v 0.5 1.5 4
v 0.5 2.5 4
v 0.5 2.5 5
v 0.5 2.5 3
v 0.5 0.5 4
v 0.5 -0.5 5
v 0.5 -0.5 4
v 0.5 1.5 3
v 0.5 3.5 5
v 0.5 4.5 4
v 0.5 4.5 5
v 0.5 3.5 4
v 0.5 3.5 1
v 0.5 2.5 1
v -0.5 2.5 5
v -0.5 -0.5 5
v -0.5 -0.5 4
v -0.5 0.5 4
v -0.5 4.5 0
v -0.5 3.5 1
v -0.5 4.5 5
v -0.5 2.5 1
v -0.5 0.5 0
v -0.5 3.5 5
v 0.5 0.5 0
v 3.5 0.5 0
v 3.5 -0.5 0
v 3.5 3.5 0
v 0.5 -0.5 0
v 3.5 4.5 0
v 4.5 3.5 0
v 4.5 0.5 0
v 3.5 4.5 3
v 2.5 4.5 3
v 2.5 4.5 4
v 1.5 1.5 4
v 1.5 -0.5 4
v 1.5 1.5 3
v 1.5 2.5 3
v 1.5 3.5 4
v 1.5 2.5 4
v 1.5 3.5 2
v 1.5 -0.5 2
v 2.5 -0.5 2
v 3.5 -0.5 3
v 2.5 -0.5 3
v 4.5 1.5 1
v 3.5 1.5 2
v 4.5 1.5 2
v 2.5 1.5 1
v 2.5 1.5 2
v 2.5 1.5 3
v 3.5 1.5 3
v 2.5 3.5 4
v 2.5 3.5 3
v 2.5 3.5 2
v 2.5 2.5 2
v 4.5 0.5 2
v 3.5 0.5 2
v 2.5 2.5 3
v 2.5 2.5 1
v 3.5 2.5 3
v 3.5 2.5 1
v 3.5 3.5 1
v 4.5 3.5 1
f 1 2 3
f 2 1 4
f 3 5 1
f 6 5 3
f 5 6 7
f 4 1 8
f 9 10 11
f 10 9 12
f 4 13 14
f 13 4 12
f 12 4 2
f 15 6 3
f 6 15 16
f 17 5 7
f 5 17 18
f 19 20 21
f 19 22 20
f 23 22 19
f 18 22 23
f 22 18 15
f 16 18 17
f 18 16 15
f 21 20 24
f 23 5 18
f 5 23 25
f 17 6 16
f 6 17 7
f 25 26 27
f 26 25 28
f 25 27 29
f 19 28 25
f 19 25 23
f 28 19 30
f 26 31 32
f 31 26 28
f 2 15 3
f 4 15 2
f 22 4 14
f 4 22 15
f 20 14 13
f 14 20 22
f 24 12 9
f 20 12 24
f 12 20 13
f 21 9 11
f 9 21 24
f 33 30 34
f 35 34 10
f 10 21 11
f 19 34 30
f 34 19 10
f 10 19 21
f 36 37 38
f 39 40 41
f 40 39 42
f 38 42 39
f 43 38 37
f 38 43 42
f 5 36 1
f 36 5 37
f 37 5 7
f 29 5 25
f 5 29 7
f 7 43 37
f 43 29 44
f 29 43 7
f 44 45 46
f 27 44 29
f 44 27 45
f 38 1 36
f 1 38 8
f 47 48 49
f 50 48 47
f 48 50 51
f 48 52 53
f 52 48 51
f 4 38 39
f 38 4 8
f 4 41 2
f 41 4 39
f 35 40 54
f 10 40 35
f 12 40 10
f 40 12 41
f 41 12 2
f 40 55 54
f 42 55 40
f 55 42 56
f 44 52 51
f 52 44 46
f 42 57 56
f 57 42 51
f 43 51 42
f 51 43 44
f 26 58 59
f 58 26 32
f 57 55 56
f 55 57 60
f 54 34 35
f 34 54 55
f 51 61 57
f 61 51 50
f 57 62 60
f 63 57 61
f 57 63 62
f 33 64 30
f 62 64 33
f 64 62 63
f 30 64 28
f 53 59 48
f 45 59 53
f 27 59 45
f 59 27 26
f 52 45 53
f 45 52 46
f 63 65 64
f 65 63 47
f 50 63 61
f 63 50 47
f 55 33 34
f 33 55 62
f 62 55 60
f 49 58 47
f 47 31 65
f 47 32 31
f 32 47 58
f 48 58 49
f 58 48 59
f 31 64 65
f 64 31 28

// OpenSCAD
union() {
    translate([0, 0, 4.5]) color([1, 0, 0]) cube([1, 1, 1], center=true);
    translate([0, 1, 2.5]) cube([1, 1, 5], center=true);
    translate([0, 2, 2.5]) cube([1, 1, 5], center=true);
    translate([0, 3, 0.5]) cube([1, 1, 1], center=true);
    translate([0, 4, 2.5]) cube([1, 1, 5], center=true);
    translate([1, 0, 2.0]) cube([1, 1, 4], center=true);
    translate([1, 1, 2.0]) cube([1, 1, 4], center=true);
    translate([1, 2, 1.5]) cube([1, 1, 3], center=true);
    translate([1, 3, 2.0]) cube([1, 1, 4], center=true);
    translate([1, 4, 2.0]) cube([1, 1, 4], center=true);
    translate([2, 0, 1.0]) cube([1, 1, 2], center=true);
    translate([2, 1, 1.0]) cube([1, 1, 2], center=true);
    translate([2, 2, 1.0]) cube([1, 1, 2], center=true);
    translate([2, 3, 1.0]) cube([1, 1, 2], center=true);
    translate([2, 4, 2.0]) cube([1, 1, 4], center=true);
    translate([3, 0, 1.5]) cube([1, 1, 3], center=true);
    translate([3, 1, 1.5]) cube([1, 1, 3], center=true);
    translate([3, 2, 0.5]) cube([1, 1, 1], center=true);
    translate([3, 3, 1.5]) cube([1, 1, 3], center=true);
    translate([3, 4, 1.5]) cube([1, 1, 3], center=true);
    translate([4, 1, 1.0]) cube([1, 1, 2], center=true);
    translate([4, 2, 0.5]) cube([1, 1, 1], center=true);
    translate([4, 3, 0.5]) cube([1, 1, 1], center=true);
}
